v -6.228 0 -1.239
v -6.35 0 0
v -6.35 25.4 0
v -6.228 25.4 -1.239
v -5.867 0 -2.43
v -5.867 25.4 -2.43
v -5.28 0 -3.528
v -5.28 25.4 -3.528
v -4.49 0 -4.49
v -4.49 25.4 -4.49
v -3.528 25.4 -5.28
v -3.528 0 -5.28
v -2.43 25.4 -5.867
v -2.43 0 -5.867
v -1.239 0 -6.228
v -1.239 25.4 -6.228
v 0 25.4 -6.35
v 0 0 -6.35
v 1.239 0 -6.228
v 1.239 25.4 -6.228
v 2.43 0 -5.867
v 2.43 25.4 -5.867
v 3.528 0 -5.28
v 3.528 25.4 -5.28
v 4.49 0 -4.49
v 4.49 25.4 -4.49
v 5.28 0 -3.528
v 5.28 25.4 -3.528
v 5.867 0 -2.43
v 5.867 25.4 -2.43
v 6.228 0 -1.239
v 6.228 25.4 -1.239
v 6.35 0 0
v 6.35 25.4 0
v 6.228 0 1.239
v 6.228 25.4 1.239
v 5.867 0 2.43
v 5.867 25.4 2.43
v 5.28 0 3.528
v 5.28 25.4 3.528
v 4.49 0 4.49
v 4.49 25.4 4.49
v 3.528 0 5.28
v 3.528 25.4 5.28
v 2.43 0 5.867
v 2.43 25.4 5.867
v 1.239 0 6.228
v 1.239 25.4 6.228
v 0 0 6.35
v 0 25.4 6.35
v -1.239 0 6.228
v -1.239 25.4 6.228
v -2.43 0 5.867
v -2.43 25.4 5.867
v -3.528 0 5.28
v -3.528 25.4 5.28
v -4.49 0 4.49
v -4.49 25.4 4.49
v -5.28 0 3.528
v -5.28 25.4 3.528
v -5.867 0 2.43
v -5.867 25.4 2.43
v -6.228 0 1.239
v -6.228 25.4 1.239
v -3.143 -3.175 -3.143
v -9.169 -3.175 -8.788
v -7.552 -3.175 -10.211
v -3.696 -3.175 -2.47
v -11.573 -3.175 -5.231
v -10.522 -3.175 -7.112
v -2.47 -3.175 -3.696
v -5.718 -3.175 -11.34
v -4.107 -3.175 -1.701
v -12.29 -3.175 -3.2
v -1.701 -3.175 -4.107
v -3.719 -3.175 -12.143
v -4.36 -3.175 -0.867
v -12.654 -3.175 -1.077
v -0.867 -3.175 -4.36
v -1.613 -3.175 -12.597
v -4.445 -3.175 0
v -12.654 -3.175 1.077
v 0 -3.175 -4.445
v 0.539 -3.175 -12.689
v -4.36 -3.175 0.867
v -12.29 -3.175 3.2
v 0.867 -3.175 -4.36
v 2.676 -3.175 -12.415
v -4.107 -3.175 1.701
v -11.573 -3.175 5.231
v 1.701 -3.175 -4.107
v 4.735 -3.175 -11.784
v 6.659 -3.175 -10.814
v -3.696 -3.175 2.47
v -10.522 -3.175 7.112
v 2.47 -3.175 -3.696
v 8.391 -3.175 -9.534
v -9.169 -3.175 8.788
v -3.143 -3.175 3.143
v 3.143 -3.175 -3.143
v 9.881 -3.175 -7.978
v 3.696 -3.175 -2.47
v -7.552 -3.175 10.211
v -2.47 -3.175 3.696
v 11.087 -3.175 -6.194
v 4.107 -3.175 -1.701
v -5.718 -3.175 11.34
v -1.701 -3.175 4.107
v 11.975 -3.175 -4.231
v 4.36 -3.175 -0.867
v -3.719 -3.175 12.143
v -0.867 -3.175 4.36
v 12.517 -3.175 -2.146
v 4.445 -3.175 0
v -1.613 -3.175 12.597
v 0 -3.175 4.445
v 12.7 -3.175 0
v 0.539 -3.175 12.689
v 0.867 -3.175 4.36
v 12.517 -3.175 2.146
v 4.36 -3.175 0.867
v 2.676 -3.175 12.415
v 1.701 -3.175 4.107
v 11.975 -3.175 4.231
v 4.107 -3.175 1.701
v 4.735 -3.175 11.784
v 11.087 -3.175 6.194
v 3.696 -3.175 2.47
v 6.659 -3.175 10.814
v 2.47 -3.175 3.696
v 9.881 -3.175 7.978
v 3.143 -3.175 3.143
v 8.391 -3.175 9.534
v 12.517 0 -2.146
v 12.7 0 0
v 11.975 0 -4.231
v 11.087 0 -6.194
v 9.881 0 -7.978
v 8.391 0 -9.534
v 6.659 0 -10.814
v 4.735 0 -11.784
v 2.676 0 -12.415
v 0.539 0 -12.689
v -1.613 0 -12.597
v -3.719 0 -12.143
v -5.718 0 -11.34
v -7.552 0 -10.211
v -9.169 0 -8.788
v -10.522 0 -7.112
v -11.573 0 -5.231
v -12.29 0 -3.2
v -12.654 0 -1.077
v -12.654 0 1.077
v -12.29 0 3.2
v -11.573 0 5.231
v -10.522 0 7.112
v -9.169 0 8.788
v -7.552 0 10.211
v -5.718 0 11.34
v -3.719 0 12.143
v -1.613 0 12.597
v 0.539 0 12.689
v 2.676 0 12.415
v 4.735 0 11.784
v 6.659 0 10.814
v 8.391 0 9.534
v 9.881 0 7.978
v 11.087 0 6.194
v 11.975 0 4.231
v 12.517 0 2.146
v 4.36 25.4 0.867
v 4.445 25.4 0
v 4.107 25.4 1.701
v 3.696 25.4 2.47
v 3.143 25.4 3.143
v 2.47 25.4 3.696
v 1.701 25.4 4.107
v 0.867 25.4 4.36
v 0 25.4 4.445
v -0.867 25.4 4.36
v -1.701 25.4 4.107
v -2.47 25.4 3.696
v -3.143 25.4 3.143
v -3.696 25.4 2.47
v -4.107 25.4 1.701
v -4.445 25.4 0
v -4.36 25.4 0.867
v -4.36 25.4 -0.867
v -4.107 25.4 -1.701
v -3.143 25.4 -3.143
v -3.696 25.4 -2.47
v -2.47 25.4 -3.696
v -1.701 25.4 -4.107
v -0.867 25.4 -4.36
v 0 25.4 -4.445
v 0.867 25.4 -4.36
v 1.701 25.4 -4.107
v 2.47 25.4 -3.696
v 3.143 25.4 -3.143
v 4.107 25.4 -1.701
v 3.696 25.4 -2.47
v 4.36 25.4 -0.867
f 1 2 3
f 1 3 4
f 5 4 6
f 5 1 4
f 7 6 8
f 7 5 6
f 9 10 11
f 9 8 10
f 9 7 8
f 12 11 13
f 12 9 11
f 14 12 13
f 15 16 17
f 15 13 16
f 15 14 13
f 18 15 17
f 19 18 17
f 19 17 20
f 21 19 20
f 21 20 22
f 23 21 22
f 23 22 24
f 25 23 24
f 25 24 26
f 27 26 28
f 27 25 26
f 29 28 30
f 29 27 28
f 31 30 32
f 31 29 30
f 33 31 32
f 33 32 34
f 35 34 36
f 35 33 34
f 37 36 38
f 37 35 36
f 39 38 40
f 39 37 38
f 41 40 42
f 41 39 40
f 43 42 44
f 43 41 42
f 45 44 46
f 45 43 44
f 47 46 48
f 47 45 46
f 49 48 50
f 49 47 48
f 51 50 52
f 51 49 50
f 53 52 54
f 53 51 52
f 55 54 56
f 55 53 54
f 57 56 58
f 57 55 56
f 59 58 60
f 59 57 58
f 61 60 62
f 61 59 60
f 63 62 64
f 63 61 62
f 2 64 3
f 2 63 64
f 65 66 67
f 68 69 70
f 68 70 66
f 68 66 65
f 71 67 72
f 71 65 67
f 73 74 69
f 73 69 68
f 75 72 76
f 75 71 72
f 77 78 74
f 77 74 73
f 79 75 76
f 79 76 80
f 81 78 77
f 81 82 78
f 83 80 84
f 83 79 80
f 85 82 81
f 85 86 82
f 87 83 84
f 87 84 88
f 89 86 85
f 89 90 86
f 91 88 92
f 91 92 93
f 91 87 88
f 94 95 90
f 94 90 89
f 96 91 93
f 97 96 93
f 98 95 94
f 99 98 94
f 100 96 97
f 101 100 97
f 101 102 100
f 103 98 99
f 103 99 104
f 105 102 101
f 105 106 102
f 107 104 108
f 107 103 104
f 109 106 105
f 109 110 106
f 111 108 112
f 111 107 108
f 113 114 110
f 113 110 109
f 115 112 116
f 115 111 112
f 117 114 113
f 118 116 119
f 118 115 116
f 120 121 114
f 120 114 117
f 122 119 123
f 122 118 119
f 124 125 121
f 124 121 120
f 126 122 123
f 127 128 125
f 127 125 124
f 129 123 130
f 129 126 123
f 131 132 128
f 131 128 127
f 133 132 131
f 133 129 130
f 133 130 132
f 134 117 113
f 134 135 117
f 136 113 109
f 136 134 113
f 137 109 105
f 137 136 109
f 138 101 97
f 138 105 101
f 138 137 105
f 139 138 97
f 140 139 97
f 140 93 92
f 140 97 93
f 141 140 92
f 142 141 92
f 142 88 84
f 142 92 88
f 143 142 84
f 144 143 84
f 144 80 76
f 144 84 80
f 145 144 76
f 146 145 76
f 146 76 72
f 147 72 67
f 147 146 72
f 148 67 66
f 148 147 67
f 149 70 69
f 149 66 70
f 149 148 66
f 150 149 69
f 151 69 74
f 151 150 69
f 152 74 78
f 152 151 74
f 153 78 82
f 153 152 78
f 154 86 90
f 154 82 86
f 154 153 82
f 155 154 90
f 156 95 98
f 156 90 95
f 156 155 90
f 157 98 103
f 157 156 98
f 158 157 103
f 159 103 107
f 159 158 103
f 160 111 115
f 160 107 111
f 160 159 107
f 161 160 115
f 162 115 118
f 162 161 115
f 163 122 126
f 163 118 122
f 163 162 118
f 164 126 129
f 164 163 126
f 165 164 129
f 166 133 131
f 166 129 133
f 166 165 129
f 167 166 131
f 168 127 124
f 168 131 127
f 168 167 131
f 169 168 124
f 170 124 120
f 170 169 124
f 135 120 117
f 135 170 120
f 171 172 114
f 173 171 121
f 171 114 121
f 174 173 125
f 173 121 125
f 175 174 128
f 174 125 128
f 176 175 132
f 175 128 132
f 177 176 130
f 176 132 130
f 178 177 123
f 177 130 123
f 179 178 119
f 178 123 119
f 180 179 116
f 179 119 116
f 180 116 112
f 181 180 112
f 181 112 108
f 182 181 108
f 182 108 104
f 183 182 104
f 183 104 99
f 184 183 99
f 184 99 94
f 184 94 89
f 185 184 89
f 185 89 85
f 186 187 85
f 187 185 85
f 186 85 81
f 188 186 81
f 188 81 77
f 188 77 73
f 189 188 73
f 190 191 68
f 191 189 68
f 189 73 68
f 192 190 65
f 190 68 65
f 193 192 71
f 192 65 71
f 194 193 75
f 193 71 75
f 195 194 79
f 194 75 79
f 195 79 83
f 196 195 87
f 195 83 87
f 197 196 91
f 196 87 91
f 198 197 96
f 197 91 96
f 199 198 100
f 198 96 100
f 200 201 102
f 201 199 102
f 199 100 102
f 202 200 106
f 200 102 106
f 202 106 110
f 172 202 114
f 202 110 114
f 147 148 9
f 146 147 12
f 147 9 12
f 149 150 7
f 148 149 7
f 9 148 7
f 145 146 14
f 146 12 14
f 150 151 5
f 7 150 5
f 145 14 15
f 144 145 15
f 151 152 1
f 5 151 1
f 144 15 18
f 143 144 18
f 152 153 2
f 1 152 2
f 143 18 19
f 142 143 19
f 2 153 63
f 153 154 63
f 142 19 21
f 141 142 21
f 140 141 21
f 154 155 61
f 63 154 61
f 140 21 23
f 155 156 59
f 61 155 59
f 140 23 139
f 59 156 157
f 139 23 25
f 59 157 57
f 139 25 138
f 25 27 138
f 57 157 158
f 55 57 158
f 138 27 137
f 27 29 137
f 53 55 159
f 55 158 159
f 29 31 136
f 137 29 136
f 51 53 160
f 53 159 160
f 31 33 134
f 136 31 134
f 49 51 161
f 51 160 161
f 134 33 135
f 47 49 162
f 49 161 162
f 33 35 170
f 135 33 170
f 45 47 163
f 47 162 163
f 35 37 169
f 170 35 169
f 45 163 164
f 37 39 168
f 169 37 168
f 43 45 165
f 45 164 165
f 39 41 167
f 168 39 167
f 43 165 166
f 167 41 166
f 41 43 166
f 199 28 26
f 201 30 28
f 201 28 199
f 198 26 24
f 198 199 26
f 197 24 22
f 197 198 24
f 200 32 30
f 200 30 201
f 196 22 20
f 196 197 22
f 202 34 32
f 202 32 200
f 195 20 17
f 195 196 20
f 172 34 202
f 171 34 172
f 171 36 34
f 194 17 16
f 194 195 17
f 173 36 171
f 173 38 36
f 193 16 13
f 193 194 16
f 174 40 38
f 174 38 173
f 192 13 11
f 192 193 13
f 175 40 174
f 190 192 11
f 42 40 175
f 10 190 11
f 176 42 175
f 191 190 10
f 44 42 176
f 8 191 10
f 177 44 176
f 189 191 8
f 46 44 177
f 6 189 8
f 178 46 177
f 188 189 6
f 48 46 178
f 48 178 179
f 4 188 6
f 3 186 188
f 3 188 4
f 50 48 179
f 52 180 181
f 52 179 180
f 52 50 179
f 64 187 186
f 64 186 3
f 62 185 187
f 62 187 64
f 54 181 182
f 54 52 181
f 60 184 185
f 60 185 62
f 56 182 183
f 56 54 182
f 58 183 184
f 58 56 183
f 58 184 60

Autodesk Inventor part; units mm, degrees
ref_plane "YZ Plane" through (0, 0, 0) normal (1, 0, 0) x (0, 1, 0)
ref_plane "XZ Plane" through (0, 0, 0) normal (0, 1, 0) x (-1, 0, 0)
ref_plane "XY Plane" through (0, 0, 0) normal (0, 0, 1) x (1, 0, 0)
sketch "Sketch1" plane through (0, 0, 0) normal (0, 1, 0) x (-1, 0, 0)
  circle A0 centre (0, 0) radius 6.35
  dimension "d0" = 12.7
extrude "Extrusion1" add sketch "Sketch1" along normal blind 25.4
sketch "Sketch2" plane through (0, 25.4, 0) normal (0, 1, 0) x (1, 0, 0)
  circle A0 centre (0, 0) radius 4.445
  dimension "d3" = 8.89
extrude "Extrusion2" cut sketch "Sketch2" against normal blind 28.575
sketch "Sketch3" plane through (0, 0, 0) normal (0, -1, 0) x (1, 0, 0)
  circle A0 centre (0, 0) radius 12.7
  dimension "d6" = 25.4
extrude "Extrusion3" add sketch "Sketch3" along normal blind 3.175
sketch "Sketch4" plane through (0, -3.175, 0) normal (0, -1, 0) x (1, 0, 0)
  circle A0 centre (0, 0) radius 4.445
  dimension "d9" = 8.89
extrude "Extrusion4" cut sketch "Sketch4" against normal blind 3.175
properties part number "Nut"
